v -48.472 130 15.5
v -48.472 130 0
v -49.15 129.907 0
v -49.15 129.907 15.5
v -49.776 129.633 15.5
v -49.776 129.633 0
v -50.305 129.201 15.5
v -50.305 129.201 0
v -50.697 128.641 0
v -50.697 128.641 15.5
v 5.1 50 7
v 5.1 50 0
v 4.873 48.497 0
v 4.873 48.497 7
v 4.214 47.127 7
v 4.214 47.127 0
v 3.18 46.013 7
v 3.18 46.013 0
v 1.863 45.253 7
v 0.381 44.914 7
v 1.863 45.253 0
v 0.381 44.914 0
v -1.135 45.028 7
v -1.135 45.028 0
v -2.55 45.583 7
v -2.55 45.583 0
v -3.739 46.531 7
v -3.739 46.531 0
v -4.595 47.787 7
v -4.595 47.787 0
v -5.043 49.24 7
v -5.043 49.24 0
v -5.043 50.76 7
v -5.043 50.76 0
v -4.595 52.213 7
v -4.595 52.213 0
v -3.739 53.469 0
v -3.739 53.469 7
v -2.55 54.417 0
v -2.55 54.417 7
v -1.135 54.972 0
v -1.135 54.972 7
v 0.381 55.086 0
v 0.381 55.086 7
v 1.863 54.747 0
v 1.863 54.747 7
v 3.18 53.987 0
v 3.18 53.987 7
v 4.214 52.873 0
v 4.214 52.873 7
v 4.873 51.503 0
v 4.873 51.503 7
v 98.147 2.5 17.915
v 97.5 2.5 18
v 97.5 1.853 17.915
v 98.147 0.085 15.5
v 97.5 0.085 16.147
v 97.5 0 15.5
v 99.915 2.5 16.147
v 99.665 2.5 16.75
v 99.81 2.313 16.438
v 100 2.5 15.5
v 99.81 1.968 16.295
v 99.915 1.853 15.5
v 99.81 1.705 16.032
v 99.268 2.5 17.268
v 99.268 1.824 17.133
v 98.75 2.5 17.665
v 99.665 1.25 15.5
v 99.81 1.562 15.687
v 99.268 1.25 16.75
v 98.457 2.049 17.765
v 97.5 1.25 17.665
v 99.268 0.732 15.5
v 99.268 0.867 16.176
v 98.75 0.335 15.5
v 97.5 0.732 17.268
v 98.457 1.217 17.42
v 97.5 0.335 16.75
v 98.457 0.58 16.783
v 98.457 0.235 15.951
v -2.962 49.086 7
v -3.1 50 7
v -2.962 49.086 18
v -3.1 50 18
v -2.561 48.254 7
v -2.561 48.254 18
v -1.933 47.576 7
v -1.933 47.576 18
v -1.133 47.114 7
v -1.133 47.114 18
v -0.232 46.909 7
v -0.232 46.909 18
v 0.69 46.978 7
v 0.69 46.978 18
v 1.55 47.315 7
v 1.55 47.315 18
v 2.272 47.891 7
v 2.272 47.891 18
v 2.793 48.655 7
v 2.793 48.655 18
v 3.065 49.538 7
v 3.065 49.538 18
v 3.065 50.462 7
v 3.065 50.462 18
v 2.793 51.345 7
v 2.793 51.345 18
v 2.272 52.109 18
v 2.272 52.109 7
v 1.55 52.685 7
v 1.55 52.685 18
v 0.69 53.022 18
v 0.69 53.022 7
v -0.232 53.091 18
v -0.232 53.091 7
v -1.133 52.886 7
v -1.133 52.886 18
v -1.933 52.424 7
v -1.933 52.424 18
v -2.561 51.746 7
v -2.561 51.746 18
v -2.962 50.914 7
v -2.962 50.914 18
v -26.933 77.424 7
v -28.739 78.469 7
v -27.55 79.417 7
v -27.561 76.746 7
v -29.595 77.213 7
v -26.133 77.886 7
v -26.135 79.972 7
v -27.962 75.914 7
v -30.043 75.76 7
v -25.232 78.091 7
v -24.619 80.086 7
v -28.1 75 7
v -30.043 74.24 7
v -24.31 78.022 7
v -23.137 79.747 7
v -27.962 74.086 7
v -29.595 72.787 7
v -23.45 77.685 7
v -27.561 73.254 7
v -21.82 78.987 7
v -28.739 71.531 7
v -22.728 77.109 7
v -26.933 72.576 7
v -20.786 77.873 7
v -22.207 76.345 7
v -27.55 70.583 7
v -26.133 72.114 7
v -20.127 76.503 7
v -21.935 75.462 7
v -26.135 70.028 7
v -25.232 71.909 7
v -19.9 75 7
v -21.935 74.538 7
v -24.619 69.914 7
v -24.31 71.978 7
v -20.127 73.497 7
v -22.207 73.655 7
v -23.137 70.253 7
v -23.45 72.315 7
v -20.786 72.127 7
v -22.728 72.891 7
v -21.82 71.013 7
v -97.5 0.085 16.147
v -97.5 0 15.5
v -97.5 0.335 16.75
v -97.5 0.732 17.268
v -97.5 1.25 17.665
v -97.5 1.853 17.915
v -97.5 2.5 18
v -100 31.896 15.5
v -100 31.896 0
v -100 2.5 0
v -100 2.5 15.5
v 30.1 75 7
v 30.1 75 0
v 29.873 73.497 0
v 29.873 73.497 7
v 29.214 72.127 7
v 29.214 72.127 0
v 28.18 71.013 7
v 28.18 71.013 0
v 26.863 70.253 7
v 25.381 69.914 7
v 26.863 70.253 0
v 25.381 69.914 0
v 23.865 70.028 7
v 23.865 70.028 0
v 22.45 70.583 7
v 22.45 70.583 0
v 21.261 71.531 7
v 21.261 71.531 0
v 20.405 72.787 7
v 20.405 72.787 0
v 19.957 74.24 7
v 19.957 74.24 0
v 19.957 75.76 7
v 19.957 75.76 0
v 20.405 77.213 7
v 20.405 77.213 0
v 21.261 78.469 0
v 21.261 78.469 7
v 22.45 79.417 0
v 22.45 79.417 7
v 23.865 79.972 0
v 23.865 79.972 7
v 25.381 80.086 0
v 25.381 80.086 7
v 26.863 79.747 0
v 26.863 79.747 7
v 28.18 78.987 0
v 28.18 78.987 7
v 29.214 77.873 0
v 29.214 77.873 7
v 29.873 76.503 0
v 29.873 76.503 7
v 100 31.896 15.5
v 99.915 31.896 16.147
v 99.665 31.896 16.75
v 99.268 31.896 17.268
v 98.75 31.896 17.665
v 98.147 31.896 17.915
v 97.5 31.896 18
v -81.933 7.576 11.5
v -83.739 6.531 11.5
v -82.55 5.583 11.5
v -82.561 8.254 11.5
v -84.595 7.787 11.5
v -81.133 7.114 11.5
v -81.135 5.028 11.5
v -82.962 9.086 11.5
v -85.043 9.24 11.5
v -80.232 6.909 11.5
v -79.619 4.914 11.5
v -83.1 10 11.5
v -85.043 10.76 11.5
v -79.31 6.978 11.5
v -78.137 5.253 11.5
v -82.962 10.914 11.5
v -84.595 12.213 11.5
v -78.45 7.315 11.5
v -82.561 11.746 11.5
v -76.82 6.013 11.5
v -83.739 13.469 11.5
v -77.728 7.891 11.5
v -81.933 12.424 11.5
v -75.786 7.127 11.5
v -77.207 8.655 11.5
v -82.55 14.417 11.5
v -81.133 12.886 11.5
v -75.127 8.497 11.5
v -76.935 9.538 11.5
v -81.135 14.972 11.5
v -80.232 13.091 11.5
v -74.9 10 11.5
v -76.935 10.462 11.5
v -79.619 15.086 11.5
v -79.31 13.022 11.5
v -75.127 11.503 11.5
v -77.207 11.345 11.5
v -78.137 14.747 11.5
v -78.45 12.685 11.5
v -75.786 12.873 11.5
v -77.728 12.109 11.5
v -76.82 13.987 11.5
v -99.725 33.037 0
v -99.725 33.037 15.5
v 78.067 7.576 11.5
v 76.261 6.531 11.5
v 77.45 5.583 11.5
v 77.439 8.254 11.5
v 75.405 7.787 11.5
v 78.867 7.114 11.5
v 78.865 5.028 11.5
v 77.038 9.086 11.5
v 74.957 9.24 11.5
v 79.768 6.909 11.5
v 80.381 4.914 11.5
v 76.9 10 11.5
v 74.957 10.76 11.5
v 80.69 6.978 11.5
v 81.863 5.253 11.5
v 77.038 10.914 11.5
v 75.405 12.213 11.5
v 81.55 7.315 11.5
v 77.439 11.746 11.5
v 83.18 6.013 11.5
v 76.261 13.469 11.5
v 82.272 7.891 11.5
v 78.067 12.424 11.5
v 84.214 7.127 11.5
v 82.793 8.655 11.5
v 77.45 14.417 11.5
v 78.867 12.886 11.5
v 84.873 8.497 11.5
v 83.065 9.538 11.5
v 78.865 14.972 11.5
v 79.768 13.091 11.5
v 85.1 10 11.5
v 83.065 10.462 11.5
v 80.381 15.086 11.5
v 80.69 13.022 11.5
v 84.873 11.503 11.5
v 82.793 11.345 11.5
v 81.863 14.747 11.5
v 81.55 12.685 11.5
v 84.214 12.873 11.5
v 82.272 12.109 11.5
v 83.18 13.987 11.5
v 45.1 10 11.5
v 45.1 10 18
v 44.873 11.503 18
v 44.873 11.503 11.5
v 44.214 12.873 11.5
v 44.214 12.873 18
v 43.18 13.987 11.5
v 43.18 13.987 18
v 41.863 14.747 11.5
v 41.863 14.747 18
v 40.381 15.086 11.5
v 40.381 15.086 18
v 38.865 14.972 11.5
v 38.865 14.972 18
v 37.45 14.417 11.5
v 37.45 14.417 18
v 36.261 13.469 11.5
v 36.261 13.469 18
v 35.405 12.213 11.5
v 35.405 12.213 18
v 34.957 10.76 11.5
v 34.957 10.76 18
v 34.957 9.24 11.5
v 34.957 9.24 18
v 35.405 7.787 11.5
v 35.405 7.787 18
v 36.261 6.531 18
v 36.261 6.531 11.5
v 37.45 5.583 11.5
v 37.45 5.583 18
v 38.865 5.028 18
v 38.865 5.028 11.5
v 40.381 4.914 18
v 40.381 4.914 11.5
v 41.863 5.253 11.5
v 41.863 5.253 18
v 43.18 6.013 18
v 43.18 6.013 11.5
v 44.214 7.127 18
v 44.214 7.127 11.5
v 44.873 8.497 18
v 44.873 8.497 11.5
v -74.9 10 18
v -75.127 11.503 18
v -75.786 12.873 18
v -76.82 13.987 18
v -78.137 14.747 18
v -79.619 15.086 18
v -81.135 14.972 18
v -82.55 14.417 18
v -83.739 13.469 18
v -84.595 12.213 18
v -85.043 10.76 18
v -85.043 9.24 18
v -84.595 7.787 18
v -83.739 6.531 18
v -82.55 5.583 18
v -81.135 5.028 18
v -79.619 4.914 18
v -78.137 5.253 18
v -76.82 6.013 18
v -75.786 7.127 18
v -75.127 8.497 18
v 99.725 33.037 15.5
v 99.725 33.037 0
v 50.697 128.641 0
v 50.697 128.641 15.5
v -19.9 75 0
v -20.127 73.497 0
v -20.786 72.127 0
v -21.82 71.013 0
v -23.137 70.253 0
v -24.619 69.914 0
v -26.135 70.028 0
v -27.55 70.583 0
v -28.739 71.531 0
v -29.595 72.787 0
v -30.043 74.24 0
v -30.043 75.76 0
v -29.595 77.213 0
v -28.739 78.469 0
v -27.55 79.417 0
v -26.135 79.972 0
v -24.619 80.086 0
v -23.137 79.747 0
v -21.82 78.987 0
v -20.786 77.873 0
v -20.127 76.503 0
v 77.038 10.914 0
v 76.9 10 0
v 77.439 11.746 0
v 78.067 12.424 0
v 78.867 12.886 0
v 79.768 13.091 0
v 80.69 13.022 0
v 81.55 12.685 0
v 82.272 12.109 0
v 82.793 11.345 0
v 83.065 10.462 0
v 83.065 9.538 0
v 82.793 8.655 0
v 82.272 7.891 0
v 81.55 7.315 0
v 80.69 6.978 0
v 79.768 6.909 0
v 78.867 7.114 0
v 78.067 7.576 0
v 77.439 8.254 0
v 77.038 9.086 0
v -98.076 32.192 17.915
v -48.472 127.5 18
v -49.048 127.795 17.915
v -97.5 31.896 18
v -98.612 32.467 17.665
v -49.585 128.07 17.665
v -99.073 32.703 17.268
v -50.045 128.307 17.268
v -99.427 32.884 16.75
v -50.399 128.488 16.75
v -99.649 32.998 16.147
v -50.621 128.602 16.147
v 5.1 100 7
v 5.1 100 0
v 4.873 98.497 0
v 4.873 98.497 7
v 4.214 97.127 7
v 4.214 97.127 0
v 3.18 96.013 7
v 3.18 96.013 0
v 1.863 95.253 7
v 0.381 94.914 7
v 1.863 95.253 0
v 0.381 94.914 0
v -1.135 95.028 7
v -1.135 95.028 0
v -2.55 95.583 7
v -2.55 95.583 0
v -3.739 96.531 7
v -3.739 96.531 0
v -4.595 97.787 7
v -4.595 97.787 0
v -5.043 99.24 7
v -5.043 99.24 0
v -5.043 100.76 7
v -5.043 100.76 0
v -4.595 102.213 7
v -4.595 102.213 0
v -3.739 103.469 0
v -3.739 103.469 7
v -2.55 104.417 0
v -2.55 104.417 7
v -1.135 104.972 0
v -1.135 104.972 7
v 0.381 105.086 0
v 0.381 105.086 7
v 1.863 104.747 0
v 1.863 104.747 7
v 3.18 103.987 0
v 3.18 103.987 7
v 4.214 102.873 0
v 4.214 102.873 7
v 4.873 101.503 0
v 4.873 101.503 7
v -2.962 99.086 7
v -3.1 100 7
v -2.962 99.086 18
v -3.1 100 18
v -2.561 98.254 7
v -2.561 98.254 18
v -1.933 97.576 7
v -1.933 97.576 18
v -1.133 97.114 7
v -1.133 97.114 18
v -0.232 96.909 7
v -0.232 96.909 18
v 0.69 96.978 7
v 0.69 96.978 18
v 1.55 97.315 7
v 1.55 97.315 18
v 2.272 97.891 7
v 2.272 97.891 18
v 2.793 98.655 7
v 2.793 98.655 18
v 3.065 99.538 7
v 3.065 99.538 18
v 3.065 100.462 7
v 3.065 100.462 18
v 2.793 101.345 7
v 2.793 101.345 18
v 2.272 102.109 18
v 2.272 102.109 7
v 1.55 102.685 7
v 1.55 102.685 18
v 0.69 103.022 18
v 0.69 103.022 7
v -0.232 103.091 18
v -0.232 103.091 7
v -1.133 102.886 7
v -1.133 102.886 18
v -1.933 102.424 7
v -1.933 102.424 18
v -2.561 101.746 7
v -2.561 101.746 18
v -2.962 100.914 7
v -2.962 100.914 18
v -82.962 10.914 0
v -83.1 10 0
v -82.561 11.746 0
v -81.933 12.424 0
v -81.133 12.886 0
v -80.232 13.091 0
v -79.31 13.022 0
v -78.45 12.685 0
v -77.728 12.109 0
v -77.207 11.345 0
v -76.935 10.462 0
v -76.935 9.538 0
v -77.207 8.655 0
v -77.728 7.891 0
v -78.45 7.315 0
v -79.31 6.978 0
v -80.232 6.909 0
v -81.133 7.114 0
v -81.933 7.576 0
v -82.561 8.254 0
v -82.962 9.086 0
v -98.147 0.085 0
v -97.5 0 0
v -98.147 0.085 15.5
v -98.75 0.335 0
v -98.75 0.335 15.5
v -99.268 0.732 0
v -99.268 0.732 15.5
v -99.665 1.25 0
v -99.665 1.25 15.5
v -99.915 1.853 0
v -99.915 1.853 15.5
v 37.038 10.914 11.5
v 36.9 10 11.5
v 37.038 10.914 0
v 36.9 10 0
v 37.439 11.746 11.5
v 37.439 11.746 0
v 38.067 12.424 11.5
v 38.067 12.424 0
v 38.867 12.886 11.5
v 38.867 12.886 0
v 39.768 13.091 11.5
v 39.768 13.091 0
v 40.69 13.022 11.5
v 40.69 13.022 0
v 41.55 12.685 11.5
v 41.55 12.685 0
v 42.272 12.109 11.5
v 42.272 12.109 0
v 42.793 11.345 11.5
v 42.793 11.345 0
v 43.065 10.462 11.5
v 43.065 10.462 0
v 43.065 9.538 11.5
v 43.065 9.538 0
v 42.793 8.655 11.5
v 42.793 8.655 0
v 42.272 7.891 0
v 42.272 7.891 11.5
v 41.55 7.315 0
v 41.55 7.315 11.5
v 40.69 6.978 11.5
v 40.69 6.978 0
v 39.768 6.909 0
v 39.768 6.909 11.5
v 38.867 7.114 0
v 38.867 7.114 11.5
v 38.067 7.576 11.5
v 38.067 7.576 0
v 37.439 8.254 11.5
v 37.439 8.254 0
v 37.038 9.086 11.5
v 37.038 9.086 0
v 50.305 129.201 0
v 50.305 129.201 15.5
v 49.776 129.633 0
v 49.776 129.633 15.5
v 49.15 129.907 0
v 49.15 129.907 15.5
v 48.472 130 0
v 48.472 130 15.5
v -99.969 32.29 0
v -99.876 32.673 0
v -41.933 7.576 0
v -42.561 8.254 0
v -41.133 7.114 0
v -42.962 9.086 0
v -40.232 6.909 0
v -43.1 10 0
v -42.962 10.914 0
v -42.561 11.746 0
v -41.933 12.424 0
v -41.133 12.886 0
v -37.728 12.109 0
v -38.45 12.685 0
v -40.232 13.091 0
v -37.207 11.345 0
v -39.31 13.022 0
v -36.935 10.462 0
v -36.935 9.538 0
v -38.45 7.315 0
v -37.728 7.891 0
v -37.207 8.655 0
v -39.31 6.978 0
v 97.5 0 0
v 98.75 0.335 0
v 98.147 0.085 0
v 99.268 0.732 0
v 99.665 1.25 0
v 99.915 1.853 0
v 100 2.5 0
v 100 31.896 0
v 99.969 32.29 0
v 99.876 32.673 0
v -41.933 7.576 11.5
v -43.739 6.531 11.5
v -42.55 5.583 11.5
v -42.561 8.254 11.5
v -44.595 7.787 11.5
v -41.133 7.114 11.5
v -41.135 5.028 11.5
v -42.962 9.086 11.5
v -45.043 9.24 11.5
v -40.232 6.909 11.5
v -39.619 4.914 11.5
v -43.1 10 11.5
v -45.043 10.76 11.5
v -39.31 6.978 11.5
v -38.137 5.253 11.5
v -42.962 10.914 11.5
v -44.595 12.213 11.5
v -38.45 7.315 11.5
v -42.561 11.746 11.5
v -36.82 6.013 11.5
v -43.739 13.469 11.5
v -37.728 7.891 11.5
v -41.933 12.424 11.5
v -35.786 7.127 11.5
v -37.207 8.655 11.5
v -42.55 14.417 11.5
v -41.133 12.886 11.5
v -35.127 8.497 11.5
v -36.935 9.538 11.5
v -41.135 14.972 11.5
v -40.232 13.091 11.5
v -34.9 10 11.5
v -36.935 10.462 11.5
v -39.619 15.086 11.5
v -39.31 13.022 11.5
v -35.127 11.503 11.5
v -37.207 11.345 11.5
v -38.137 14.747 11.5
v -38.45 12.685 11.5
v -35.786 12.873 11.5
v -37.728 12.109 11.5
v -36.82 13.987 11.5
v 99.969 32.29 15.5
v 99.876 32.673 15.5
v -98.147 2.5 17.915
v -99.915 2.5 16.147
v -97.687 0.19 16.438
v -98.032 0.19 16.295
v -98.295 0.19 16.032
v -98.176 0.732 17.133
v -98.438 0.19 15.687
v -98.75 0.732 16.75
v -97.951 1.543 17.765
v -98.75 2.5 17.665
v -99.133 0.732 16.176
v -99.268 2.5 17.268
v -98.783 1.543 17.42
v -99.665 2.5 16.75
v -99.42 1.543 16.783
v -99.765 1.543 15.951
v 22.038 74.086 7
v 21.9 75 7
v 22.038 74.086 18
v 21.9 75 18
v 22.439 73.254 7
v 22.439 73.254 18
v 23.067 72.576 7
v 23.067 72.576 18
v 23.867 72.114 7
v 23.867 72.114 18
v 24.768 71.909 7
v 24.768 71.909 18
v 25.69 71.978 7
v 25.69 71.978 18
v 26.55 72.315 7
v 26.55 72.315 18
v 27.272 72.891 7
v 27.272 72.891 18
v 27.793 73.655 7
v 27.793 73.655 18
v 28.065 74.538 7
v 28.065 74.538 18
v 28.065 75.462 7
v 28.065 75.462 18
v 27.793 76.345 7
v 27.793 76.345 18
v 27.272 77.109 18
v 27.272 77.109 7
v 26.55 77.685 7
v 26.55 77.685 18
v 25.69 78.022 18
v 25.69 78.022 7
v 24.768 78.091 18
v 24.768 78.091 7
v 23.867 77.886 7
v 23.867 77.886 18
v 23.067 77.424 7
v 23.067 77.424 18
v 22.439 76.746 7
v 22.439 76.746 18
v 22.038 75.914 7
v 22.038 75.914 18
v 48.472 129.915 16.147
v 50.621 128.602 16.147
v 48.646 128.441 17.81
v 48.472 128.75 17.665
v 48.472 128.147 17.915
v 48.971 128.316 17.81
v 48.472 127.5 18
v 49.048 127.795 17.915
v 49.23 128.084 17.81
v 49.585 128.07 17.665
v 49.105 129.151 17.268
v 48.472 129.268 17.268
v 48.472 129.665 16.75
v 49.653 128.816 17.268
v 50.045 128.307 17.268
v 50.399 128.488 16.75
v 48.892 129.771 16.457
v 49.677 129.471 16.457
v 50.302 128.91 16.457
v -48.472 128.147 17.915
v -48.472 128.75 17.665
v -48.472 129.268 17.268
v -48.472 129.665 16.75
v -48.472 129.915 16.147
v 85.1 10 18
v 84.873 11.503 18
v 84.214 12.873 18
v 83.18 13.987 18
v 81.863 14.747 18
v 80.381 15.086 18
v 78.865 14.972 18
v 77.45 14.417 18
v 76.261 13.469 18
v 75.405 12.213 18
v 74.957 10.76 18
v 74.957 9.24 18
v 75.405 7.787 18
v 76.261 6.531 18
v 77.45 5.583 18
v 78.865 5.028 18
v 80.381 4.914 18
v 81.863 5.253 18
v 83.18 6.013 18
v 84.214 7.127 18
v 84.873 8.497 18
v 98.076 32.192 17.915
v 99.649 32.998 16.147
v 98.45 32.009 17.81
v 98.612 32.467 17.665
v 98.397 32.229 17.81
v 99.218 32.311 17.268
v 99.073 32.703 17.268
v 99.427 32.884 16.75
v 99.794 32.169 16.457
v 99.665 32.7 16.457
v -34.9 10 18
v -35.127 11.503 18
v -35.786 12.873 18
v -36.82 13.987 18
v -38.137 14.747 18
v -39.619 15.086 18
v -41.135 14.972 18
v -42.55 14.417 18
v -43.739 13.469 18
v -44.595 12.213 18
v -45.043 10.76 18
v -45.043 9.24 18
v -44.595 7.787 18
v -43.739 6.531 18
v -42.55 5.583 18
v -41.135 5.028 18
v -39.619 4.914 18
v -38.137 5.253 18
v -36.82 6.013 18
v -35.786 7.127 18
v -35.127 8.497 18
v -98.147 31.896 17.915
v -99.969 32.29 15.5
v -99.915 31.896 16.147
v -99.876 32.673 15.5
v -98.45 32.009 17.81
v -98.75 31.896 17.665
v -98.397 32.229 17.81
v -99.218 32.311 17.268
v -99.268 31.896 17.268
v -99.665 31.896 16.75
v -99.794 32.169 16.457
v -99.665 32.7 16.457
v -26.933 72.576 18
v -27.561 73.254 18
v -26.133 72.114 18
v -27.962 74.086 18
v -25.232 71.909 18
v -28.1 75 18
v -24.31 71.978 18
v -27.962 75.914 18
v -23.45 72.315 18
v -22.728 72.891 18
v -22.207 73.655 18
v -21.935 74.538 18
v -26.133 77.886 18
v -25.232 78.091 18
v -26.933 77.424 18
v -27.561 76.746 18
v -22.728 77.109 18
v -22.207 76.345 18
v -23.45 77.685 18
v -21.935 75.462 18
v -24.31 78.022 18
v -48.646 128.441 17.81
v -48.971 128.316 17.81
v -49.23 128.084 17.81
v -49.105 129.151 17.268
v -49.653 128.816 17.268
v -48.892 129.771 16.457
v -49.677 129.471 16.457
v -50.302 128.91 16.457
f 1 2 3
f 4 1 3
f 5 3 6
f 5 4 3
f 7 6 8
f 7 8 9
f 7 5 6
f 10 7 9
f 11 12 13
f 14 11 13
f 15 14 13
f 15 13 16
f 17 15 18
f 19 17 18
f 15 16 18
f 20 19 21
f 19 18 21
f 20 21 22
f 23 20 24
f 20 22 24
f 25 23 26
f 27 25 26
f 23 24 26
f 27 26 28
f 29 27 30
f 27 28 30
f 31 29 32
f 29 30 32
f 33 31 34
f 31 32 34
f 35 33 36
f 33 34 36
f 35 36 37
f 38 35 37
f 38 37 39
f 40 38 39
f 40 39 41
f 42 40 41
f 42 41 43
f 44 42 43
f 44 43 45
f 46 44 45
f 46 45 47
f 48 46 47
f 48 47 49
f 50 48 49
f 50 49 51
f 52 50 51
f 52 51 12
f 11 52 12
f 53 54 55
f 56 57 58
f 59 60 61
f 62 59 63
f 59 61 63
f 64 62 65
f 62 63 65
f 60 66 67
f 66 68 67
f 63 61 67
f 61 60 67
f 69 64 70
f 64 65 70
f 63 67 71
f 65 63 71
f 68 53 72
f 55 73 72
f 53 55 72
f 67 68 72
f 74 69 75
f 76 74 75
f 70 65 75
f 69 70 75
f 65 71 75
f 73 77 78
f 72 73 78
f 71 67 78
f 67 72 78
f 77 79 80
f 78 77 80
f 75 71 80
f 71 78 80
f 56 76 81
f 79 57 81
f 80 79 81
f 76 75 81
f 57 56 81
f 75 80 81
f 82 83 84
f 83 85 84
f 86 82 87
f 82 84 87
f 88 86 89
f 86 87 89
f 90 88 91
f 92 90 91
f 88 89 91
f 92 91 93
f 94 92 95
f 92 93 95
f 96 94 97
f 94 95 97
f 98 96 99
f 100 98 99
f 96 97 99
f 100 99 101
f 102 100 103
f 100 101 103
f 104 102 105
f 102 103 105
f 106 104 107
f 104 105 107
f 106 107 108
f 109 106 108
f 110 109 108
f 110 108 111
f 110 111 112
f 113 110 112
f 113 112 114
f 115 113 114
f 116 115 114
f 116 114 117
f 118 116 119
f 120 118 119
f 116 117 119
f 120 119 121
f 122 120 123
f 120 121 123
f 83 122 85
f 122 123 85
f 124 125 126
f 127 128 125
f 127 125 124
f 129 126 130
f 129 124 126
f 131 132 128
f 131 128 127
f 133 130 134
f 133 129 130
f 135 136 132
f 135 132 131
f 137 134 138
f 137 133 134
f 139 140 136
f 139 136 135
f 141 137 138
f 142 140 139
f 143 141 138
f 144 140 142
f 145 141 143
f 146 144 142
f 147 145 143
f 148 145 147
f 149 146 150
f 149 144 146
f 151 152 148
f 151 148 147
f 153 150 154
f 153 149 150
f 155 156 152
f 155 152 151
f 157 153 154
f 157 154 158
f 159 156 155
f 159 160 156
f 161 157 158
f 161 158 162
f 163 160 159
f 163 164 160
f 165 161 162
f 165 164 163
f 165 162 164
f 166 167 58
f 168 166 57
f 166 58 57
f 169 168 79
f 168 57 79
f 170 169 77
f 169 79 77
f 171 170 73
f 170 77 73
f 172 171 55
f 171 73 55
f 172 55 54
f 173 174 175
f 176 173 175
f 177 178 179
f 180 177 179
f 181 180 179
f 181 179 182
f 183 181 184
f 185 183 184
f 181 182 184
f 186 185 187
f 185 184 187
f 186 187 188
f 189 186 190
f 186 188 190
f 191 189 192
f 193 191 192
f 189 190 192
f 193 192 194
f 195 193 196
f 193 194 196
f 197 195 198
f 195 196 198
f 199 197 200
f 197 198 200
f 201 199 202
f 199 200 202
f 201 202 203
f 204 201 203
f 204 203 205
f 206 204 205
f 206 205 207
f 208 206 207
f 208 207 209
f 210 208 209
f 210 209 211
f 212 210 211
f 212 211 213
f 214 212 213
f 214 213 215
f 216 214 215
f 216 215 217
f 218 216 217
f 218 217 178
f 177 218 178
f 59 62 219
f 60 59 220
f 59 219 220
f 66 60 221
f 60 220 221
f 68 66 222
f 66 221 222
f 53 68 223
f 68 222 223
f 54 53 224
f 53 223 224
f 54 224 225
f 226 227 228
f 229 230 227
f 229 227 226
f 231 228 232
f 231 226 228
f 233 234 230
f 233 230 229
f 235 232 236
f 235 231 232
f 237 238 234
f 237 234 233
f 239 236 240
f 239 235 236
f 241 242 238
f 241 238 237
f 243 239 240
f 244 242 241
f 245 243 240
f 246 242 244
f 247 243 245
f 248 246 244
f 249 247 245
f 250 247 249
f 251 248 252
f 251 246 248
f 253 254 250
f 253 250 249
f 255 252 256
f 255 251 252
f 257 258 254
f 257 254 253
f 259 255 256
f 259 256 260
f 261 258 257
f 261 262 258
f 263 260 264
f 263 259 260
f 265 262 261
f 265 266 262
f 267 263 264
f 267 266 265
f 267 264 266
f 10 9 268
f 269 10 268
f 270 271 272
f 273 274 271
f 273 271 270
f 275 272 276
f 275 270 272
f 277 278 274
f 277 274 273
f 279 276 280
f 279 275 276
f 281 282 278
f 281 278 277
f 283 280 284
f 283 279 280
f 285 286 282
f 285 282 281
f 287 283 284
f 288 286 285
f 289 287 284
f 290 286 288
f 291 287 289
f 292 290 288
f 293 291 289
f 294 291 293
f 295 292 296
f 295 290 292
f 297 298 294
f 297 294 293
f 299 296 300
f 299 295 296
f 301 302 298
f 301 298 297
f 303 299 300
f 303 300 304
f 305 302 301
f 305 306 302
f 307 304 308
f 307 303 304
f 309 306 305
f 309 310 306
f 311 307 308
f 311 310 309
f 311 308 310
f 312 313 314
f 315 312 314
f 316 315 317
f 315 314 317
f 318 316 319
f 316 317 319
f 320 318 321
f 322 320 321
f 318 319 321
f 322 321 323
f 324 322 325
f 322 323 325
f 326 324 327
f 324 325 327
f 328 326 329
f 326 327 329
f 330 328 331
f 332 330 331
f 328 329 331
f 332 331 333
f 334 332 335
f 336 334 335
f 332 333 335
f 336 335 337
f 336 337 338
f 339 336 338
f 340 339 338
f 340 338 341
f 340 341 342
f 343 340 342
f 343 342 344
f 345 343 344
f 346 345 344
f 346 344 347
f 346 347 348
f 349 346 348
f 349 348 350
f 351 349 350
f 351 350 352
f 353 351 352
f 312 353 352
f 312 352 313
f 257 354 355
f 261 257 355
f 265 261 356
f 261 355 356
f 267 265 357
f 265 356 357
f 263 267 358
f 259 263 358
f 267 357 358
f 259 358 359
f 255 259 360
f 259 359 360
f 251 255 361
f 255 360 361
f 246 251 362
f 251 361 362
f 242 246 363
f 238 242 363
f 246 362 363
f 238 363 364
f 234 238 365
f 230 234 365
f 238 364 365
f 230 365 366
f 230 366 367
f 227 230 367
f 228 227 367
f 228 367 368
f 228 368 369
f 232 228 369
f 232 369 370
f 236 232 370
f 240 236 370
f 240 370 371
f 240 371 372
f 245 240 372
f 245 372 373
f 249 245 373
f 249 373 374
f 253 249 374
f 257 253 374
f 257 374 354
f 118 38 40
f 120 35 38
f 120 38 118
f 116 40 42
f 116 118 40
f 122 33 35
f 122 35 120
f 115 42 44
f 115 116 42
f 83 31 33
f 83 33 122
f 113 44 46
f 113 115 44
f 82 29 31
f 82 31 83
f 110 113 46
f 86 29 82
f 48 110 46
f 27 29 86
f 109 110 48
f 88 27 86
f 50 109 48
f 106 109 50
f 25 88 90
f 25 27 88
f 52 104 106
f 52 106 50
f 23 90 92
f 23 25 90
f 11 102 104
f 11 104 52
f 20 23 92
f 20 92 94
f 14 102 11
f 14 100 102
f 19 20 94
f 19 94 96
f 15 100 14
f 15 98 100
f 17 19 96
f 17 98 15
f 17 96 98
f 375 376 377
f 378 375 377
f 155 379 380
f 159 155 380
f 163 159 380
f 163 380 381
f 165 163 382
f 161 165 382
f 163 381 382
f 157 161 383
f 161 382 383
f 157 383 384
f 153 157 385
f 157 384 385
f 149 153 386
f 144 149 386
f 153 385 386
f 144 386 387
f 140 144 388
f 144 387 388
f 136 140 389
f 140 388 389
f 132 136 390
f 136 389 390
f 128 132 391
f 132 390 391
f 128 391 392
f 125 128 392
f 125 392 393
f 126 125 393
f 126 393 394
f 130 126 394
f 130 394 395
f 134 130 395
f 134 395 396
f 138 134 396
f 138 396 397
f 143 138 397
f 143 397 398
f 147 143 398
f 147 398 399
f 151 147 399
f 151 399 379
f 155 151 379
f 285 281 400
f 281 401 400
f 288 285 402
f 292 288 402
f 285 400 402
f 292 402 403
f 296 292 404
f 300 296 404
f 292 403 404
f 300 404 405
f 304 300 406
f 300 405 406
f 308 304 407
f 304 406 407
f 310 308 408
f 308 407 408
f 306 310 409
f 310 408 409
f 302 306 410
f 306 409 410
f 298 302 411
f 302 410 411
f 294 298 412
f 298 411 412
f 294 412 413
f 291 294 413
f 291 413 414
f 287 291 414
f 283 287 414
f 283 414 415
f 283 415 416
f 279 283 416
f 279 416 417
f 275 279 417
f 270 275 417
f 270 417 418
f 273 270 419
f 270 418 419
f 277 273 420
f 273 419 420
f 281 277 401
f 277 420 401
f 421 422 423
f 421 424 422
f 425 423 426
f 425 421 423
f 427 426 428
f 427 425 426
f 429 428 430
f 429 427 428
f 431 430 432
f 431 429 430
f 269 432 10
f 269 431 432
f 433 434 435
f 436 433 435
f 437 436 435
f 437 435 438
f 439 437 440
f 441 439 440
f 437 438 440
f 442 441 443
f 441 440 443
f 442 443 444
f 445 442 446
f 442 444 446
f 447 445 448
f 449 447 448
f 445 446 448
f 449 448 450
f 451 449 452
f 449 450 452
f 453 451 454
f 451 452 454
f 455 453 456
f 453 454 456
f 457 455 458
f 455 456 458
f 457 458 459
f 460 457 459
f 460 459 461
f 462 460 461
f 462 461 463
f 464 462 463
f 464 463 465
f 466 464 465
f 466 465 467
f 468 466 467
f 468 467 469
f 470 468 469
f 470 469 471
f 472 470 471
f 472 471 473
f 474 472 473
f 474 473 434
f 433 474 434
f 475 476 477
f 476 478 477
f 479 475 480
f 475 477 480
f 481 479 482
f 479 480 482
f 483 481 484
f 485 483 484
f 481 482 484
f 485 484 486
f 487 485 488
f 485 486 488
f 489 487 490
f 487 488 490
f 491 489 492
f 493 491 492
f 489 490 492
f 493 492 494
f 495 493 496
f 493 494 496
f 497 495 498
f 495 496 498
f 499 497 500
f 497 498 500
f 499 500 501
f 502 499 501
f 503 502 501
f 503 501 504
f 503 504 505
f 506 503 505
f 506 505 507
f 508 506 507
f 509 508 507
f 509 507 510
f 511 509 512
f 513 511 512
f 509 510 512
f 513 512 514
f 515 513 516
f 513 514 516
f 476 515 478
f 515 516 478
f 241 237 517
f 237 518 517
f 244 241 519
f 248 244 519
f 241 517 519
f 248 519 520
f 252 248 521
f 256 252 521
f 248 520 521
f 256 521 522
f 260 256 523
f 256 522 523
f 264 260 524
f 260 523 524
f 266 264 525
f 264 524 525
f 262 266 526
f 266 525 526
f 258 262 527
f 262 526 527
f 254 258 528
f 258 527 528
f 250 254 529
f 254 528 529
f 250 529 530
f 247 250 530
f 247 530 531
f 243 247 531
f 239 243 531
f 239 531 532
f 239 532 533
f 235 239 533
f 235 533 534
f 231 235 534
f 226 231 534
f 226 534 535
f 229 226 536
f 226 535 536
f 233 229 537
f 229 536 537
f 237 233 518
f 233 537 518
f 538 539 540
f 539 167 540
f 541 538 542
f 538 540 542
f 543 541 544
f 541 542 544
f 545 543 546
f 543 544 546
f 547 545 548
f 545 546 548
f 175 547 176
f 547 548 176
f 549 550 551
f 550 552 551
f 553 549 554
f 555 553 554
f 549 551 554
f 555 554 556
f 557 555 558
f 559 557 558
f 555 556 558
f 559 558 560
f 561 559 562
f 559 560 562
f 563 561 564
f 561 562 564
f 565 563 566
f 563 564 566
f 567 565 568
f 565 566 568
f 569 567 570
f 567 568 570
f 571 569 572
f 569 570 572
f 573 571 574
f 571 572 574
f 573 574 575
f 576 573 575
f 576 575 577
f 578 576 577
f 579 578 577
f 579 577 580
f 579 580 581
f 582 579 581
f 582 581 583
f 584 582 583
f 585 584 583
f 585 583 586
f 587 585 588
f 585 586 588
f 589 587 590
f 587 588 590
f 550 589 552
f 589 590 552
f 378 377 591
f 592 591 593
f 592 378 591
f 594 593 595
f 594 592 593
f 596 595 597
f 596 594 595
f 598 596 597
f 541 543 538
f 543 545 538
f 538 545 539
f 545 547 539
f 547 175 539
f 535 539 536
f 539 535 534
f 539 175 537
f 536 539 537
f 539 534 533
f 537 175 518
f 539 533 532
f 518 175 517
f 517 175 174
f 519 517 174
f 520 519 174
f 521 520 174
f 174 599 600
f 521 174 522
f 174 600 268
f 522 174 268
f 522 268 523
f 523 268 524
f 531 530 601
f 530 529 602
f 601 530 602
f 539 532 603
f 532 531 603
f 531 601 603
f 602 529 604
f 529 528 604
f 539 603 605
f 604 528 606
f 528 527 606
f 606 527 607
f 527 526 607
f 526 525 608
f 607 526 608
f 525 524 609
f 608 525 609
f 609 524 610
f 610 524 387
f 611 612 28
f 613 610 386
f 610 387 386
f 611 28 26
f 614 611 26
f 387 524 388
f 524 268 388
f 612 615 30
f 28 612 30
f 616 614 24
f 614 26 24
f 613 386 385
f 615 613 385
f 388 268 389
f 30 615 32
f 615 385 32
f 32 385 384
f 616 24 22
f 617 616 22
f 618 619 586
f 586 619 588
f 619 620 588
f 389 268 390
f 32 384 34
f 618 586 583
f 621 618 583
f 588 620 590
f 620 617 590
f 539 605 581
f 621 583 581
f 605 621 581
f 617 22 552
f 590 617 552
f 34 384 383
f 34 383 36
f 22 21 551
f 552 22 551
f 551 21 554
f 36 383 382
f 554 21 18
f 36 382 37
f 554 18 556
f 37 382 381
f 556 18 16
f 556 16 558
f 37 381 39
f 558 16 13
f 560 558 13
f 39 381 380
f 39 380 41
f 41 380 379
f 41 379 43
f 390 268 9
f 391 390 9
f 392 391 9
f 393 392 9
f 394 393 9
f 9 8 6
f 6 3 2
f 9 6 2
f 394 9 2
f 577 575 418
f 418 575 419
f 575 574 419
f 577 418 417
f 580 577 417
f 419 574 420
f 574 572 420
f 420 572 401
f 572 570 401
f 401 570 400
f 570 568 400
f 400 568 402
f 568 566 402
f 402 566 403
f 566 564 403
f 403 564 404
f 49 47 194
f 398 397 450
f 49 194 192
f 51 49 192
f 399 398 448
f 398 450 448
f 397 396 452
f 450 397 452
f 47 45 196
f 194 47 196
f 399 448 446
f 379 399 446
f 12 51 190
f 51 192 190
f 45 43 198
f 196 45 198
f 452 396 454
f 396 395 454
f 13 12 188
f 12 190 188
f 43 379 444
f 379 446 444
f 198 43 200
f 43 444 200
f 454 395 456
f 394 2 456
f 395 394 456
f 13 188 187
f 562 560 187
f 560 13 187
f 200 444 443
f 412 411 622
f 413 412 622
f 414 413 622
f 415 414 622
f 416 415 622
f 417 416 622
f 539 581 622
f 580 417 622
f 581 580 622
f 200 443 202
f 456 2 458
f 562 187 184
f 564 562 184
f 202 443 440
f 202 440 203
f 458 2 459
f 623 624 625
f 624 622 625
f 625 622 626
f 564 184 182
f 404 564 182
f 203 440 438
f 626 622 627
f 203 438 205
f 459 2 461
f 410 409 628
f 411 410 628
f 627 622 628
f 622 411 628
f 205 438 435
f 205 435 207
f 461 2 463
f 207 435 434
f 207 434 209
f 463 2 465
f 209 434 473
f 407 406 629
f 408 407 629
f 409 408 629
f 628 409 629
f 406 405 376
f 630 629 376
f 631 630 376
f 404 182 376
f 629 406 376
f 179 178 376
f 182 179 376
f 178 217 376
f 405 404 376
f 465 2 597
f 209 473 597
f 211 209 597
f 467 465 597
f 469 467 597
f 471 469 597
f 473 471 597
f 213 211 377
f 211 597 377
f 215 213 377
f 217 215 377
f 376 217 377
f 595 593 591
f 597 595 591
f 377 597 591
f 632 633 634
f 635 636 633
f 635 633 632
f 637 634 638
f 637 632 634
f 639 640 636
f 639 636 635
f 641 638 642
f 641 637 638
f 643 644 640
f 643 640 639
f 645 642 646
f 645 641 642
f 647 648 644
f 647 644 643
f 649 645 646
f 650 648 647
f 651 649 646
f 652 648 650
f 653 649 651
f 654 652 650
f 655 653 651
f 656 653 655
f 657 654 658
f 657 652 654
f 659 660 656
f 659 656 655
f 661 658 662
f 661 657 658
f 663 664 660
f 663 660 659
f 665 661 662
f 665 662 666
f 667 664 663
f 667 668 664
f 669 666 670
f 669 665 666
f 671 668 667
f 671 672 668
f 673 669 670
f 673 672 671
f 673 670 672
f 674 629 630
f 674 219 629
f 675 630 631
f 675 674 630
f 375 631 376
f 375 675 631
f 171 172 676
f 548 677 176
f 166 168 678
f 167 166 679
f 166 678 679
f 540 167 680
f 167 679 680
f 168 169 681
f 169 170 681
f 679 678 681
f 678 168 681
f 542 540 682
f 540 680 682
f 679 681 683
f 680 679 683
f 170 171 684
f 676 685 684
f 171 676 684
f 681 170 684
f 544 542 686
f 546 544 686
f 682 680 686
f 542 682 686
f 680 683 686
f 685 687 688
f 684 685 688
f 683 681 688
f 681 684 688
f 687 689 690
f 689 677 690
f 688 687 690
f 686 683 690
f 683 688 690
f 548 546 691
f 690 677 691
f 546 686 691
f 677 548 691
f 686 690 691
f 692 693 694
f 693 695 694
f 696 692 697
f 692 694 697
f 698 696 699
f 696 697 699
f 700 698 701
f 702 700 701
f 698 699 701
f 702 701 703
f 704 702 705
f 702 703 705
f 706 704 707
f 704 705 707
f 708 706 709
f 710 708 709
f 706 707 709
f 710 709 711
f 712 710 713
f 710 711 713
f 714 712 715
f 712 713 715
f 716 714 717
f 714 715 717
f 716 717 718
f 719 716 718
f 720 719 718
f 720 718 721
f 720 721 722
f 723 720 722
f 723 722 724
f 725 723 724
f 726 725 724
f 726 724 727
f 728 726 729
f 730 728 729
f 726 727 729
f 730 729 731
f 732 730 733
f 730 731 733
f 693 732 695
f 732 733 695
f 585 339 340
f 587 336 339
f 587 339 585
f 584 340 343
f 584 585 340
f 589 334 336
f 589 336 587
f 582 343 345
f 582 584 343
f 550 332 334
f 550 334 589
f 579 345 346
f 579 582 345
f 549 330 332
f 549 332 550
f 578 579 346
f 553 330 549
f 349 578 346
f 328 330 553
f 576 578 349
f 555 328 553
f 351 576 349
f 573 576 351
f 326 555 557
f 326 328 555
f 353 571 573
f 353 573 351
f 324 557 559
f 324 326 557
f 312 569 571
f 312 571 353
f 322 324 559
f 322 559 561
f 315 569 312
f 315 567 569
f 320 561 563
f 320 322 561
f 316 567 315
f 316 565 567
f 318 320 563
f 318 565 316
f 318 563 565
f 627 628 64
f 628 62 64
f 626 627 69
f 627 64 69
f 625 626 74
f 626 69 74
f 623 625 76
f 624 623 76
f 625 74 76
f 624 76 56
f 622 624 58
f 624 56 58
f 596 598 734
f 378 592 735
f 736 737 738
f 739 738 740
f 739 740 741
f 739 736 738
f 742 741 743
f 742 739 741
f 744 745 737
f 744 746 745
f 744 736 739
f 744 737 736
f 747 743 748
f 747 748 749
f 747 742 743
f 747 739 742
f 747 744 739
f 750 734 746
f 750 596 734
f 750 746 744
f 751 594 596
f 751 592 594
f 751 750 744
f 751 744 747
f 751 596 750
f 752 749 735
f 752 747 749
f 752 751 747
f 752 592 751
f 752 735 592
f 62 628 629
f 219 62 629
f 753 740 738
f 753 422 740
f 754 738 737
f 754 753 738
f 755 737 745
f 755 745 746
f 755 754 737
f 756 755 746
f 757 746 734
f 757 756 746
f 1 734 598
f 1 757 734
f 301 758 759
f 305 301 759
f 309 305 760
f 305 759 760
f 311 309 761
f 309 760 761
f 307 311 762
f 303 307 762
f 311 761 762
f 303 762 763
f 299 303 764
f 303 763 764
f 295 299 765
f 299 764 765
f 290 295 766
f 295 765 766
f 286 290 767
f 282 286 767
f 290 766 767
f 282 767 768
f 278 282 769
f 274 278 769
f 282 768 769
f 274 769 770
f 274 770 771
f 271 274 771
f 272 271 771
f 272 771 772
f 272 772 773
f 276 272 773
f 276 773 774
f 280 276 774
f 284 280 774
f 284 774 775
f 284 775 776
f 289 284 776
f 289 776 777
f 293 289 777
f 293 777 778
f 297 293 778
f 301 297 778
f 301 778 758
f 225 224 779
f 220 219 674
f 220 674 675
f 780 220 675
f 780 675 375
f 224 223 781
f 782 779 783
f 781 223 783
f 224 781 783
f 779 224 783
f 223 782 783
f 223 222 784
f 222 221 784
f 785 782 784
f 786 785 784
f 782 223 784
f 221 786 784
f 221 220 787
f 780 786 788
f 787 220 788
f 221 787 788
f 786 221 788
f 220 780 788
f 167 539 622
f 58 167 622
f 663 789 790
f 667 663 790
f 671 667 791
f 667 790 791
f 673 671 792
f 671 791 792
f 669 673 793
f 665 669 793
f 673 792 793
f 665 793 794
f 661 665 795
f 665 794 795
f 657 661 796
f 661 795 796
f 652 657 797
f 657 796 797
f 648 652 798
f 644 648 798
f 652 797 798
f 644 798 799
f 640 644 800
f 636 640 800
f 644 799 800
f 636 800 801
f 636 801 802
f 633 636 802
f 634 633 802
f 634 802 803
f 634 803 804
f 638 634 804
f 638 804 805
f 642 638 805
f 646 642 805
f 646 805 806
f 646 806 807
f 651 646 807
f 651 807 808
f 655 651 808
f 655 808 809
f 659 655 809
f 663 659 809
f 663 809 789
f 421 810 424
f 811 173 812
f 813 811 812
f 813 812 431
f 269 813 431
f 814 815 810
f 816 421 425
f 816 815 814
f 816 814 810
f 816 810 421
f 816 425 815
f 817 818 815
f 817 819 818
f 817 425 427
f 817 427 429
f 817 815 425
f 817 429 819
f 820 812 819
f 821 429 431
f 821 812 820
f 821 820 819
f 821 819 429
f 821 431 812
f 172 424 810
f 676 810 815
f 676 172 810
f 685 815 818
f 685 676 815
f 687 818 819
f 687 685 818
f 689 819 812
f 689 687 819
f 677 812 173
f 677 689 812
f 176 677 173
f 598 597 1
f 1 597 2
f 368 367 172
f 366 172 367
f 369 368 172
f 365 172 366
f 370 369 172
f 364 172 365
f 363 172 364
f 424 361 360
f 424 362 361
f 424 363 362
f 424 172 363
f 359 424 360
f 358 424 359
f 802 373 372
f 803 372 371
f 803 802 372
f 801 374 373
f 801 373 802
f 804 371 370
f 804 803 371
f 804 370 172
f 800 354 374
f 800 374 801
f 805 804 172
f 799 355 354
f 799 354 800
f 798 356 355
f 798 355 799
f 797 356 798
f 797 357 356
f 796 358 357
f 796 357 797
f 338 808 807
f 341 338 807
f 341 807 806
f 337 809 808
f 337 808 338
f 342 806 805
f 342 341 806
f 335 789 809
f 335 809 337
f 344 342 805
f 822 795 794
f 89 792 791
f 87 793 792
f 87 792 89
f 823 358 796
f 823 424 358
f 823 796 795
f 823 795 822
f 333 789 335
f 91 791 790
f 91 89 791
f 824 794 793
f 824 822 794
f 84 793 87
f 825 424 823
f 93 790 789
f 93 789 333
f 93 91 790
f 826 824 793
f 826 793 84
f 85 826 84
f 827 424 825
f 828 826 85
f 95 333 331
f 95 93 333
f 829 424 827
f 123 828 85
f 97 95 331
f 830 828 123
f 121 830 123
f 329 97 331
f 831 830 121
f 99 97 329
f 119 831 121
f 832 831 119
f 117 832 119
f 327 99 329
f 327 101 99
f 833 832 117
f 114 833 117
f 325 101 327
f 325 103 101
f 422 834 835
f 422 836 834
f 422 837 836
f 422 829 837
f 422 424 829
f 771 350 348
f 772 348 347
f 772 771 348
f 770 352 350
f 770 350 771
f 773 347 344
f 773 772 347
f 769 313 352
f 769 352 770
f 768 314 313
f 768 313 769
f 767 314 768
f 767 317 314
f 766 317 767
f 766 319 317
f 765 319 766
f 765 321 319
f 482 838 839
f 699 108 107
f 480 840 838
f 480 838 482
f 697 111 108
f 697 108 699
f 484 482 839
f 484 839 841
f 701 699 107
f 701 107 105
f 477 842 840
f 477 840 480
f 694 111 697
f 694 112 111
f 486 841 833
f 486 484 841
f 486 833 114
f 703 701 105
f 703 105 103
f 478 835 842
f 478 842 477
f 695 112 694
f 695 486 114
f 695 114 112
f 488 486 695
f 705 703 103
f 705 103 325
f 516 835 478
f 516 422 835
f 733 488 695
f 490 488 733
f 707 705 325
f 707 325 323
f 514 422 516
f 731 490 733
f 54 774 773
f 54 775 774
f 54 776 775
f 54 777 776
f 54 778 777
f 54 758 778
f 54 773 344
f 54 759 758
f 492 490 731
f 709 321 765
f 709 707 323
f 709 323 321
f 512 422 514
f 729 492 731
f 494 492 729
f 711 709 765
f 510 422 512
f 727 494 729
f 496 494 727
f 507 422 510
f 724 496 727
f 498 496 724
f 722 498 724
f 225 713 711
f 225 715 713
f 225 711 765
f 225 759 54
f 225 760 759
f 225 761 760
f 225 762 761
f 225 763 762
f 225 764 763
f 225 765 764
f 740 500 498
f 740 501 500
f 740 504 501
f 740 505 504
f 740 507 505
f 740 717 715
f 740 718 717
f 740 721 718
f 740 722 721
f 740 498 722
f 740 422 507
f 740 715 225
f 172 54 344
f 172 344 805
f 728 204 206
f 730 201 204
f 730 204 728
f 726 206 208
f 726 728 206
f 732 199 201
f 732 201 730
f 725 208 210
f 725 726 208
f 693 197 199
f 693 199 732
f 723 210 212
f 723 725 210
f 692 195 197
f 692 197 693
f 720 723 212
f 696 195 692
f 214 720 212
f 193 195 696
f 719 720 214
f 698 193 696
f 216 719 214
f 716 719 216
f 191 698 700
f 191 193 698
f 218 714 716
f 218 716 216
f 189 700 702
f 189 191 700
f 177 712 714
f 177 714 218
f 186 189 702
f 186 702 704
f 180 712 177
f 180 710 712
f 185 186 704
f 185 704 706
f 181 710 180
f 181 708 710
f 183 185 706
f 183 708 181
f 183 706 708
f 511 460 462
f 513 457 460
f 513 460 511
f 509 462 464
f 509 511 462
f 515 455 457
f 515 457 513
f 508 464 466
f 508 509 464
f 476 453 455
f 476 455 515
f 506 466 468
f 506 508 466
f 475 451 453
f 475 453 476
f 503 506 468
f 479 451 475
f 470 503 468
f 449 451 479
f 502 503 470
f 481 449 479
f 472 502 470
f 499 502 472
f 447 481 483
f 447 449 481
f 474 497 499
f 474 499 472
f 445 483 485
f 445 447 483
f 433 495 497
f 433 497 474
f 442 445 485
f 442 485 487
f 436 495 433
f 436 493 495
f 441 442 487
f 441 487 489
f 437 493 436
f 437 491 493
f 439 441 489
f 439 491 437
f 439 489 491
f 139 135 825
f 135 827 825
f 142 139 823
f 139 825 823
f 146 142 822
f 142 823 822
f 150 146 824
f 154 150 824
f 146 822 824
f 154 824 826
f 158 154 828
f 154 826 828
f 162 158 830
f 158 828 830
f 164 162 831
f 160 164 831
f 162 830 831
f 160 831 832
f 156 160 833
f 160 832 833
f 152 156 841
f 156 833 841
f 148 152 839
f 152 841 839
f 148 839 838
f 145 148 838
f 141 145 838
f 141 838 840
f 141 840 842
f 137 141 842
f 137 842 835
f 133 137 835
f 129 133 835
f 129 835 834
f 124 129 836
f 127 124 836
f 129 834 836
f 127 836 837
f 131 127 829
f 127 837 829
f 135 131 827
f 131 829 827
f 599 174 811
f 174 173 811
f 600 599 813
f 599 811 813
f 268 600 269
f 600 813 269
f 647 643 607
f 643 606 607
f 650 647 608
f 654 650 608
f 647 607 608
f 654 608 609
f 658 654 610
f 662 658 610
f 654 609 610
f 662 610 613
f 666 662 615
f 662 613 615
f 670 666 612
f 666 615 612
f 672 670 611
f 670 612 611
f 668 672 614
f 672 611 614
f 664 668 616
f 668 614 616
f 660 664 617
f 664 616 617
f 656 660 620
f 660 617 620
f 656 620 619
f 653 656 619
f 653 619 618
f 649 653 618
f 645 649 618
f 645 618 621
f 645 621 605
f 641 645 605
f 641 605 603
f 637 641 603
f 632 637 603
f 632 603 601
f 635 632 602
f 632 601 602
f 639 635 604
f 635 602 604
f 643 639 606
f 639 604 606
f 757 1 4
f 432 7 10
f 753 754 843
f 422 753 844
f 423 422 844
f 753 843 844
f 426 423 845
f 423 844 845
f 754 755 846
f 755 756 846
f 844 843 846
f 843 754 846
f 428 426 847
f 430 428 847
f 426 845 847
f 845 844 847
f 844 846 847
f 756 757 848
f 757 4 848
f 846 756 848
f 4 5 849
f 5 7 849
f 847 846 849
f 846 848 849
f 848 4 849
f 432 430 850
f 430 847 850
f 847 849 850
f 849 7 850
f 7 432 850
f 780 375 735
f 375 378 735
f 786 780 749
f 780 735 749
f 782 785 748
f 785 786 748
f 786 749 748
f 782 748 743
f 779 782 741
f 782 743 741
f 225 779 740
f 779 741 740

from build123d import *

# Parameters (mm, degrees)
F1_DEPTH       = 18
F2_D           = 6.2
F2_CBORE_D     = 10.2
F2_CBORE_DEPTH = 7
F4_D           = 6.2
F4_CBORE_D     = 10.2
F4_CBORE_DEPTH = 6.5
F5_R           = 2.5


with BuildPart() as f1:
    # F0 (on Top) → F1 (new body)
    with BuildSketch(Plane.XY):
        Polygon((-80, 0), (0, 0), (100, 0), (100, 32.5), (50, 130), (0, 130), (-50, 130), (-100, 32.5), (-100, 0), align=None)
    extrude(amount=F1_DEPTH)

    # F2 (through all)
    with Locations(Plane(origin=(0, 0, 0), x_dir=(1, 0, 0), z_dir=(0, 0, -1))):
        with Locations((0, -100), (25, -75), (0, -50), (-25, -75)):
            CounterBoreHole(F2_D / 2, F2_CBORE_D / 2, F2_CBORE_DEPTH)

    # F4 (through all)
    with Locations(Plane.XY.offset(18)):
        with Locations((-80, 10), (-40, 10), (40, 10), (80, 10)):
            CounterBoreHole(F4_D / 2, F4_CBORE_D / 2, F4_CBORE_DEPTH)

    # F5
    f5_edges = [f1.edges().sort_by_distance(p)[0] for p in [
        (-100, 32.5, 9),
        (-100, 16.25, 18),
        (0, 0, 18),
        (100, 16.25, 18),
        (-75, 81.25, 18),
        (75, 81.25, 18),
        (50, 130, 9),
        (-50, 130, 9),
        (100, 0, 9),
        (-100, 0, 9),
        (100, 32.5, 9),
        (0, 130, 18),
    ]]
    fillet(f5_edges, radius=F5_R)


solid = f1.part
